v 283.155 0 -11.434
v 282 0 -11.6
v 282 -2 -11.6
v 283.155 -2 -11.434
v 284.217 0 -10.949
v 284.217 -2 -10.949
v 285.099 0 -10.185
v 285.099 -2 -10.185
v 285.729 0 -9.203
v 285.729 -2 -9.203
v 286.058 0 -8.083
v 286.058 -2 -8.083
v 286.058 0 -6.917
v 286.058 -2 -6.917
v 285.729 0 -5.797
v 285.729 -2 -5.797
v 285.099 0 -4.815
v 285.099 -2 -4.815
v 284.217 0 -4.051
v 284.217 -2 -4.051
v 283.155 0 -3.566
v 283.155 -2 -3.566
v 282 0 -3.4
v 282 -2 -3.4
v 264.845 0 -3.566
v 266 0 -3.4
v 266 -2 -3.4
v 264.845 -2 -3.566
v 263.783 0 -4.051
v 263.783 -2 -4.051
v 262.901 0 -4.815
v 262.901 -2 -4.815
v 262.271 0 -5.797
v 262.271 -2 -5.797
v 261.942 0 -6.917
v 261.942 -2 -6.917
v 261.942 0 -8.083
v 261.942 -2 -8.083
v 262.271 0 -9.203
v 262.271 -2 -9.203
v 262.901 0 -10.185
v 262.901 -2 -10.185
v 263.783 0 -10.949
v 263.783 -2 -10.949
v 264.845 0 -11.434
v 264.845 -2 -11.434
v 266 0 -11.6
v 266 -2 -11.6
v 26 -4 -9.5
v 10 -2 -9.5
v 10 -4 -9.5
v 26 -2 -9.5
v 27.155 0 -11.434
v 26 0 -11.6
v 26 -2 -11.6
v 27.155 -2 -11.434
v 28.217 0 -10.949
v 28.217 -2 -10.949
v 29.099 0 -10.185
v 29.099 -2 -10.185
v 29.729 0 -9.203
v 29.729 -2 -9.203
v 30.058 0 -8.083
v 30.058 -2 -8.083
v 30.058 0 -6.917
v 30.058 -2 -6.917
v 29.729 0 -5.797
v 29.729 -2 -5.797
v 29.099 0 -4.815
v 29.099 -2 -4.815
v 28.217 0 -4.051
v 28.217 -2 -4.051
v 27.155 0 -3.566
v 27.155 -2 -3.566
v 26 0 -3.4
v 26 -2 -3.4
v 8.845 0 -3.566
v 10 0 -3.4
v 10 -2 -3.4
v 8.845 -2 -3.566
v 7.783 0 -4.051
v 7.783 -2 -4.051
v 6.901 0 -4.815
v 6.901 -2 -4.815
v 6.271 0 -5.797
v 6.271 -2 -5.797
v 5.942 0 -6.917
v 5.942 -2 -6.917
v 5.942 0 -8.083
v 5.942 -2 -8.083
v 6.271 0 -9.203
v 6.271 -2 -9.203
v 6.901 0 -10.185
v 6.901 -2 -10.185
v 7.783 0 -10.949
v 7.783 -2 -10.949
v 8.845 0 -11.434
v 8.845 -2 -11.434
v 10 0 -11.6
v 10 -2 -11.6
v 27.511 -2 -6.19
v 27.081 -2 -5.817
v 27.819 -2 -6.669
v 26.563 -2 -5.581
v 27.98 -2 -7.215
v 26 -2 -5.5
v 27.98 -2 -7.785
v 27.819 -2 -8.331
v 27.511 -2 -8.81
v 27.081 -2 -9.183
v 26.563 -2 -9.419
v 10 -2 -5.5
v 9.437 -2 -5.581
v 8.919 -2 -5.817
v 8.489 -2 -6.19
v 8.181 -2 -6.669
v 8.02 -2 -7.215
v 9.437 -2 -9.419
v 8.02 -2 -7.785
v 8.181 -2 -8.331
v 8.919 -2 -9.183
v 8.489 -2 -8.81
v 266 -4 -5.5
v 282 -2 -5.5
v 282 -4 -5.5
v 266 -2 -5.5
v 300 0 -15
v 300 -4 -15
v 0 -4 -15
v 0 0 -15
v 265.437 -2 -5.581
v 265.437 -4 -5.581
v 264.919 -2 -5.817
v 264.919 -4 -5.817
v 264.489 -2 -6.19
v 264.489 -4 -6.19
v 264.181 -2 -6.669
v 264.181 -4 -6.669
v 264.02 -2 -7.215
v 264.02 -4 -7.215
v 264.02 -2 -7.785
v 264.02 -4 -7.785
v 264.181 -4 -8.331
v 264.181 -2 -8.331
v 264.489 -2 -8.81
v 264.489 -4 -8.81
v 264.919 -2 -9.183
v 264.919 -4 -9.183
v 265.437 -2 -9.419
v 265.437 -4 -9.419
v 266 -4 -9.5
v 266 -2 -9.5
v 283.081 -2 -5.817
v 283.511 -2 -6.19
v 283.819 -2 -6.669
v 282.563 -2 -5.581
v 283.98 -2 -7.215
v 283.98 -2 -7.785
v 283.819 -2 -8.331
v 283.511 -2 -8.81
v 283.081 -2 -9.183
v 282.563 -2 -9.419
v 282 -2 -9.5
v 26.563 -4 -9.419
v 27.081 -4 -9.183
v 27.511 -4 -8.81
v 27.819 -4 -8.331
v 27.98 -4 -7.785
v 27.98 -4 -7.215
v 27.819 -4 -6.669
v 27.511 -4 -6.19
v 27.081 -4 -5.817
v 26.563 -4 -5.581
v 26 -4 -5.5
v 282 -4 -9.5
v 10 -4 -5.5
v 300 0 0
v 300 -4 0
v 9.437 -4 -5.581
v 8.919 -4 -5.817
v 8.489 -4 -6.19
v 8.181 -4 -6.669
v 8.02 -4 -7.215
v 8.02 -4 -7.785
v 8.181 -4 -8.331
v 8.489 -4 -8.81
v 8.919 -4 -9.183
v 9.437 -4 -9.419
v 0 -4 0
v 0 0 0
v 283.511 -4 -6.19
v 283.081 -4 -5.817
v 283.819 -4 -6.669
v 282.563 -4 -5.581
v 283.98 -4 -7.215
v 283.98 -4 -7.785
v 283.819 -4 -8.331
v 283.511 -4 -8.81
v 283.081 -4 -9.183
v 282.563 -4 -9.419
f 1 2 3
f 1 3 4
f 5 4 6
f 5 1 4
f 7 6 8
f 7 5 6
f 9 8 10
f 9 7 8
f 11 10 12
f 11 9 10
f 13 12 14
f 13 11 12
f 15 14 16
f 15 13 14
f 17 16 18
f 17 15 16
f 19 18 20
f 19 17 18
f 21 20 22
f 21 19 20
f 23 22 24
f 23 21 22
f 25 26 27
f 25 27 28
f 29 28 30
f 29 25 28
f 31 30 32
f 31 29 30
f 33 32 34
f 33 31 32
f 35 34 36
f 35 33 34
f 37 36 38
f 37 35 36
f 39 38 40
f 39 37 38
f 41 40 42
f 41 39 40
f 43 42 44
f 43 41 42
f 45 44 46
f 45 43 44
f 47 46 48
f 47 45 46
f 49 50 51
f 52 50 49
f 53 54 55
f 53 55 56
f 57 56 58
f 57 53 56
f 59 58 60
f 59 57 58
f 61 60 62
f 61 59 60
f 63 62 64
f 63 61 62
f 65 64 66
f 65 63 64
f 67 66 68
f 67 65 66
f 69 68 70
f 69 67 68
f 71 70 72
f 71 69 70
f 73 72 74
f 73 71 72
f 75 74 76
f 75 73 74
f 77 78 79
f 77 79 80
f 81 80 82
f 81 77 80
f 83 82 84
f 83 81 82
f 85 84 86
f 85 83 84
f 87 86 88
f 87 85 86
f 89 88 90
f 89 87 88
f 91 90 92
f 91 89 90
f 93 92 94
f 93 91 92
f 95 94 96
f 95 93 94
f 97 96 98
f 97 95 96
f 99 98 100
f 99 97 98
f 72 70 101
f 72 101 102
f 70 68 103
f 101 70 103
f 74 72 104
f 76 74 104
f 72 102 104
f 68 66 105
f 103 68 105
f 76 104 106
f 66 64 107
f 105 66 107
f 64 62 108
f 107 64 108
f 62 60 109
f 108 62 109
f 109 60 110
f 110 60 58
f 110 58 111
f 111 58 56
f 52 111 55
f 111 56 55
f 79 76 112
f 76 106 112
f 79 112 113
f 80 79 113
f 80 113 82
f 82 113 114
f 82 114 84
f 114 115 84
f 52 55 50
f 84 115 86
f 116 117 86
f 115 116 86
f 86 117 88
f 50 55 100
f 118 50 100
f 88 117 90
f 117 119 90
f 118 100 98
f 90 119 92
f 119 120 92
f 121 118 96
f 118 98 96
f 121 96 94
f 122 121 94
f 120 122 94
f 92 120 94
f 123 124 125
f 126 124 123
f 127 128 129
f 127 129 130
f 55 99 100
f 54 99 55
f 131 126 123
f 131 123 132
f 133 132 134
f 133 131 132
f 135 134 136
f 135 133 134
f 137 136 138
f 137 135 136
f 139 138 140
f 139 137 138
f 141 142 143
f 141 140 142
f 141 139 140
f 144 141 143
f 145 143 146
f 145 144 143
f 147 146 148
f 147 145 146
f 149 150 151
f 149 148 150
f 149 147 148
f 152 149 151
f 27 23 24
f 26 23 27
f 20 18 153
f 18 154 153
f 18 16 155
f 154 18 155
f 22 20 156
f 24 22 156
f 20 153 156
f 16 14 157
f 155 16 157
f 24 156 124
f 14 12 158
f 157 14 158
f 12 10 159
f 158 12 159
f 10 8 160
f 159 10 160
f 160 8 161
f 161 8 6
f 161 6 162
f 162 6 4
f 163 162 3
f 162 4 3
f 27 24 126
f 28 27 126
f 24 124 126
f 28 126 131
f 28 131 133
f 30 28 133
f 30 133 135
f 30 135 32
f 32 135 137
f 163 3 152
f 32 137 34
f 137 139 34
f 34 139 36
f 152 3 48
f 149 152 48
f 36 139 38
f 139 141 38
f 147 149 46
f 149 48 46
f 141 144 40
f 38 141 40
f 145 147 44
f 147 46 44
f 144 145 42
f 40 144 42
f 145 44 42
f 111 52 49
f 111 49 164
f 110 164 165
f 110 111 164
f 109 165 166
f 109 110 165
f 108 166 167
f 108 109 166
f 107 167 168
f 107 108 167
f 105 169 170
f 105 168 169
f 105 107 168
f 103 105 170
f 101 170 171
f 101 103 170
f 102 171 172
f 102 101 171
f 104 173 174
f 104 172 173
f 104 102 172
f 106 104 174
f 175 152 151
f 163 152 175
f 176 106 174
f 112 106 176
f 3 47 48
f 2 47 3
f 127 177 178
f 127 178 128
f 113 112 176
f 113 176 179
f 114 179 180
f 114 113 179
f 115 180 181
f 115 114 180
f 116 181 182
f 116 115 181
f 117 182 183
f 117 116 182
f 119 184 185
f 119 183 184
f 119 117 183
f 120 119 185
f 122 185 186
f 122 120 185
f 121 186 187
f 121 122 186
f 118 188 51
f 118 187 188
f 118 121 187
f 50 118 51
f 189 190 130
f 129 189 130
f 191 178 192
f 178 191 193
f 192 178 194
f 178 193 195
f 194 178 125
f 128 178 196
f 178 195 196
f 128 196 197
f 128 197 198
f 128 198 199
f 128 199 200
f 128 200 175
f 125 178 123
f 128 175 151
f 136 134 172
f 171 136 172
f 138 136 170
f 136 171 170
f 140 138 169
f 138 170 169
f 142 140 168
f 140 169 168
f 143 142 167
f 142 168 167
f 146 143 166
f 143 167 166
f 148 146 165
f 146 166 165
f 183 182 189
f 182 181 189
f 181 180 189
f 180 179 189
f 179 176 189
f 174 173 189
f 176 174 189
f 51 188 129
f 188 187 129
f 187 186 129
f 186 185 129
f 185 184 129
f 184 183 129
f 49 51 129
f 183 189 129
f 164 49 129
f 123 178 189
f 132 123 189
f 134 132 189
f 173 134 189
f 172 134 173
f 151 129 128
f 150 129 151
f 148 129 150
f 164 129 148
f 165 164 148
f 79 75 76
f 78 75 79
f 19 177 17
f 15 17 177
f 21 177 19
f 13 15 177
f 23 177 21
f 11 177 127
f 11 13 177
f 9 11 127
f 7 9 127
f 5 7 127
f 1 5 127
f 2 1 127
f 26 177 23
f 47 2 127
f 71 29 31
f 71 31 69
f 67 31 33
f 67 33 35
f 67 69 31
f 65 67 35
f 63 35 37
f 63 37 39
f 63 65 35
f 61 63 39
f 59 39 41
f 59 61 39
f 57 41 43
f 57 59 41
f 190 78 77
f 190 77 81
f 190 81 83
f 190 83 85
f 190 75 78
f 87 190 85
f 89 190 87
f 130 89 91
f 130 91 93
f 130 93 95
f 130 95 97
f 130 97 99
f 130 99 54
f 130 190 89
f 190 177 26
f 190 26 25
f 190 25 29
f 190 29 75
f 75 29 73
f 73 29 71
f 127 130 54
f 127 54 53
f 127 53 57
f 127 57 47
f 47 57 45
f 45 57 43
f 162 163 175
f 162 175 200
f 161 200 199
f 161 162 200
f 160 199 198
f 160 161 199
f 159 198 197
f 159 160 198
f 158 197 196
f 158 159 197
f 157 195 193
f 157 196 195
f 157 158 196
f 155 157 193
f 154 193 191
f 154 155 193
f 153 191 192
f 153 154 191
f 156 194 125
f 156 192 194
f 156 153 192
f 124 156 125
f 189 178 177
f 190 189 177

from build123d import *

# Parameters (mm, degrees)
SKETCH1_W           = 15
SKETCH1_H           = 4
BOSS_EXTRUDE1_DEPTH = 300
CUT_EXTRUDE1_DEPTH  = 301.401398133
CUT_EXTRUDE2_DEPTH  = 2


with BuildPart() as part:
    # Sketch1 → Boss-Extrude1 (new body)
    with BuildSketch(Plane(origin=(0, 0, 0), x_dir=(0, 0, -1), z_dir=(1, 0, 0))):
        with Locations((7.5, -2)):
            Rectangle(SKETCH1_W, SKETCH1_H)
    extrude(amount=BOSS_EXTRUDE1_DEPTH)

    # Sketch3 → Cut-Extrude1 (cut, through all)
    with BuildSketch(Plane(origin=(0, 0, 0), x_dir=(1, 0, 0), z_dir=(0, 1, 0))):
        with BuildLine():
            Line((10, 9.5), (26, 9.5))
            ThreePointArc((26, 9.5), (28, 7.5), (26, 5.5))
            Line((26, 5.5), (10, 5.5))
            ThreePointArc((10, 5.5), (8, 7.5), (10, 9.5))
        make_face()
        with BuildLine():
            Line((266, 9.5), (282, 9.5))
            ThreePointArc((282, 9.5), (284, 7.5), (282, 5.5))
            Line((282, 5.5), (266, 5.5))
            ThreePointArc((266, 5.5), (264, 7.5), (266, 9.5))
        make_face()
    extrude(amount=-CUT_EXTRUDE1_DEPTH, mode=Mode.SUBTRACT)

    # Sketch4 → Cut-Extrude2 (cut)
    with BuildSketch(Plane(origin=(0, 0, 0), x_dir=(1, 0, 0), z_dir=(0, 1, 0))):
        with BuildLine():
            Line((10, 11.6), (26, 11.6))
            ThreePointArc((26, 11.6), (30.1, 7.5), (26, 3.4))
            Line((26, 3.4), (10, 3.4))
            ThreePointArc((10, 3.4), (5.9, 7.5), (10, 11.6))
        make_face()
        with BuildLine():
            Line((266, 11.6), (282, 11.6))
            ThreePointArc((282, 11.6), (286.1, 7.5), (282, 3.4))
            Line((282, 3.4), (266, 3.4))
            ThreePointArc((266, 3.4), (261.9, 7.5), (266, 11.6))
        make_face()
    extrude(amount=-CUT_EXTRUDE2_DEPTH, mode=Mode.SUBTRACT)


solid = part.part
